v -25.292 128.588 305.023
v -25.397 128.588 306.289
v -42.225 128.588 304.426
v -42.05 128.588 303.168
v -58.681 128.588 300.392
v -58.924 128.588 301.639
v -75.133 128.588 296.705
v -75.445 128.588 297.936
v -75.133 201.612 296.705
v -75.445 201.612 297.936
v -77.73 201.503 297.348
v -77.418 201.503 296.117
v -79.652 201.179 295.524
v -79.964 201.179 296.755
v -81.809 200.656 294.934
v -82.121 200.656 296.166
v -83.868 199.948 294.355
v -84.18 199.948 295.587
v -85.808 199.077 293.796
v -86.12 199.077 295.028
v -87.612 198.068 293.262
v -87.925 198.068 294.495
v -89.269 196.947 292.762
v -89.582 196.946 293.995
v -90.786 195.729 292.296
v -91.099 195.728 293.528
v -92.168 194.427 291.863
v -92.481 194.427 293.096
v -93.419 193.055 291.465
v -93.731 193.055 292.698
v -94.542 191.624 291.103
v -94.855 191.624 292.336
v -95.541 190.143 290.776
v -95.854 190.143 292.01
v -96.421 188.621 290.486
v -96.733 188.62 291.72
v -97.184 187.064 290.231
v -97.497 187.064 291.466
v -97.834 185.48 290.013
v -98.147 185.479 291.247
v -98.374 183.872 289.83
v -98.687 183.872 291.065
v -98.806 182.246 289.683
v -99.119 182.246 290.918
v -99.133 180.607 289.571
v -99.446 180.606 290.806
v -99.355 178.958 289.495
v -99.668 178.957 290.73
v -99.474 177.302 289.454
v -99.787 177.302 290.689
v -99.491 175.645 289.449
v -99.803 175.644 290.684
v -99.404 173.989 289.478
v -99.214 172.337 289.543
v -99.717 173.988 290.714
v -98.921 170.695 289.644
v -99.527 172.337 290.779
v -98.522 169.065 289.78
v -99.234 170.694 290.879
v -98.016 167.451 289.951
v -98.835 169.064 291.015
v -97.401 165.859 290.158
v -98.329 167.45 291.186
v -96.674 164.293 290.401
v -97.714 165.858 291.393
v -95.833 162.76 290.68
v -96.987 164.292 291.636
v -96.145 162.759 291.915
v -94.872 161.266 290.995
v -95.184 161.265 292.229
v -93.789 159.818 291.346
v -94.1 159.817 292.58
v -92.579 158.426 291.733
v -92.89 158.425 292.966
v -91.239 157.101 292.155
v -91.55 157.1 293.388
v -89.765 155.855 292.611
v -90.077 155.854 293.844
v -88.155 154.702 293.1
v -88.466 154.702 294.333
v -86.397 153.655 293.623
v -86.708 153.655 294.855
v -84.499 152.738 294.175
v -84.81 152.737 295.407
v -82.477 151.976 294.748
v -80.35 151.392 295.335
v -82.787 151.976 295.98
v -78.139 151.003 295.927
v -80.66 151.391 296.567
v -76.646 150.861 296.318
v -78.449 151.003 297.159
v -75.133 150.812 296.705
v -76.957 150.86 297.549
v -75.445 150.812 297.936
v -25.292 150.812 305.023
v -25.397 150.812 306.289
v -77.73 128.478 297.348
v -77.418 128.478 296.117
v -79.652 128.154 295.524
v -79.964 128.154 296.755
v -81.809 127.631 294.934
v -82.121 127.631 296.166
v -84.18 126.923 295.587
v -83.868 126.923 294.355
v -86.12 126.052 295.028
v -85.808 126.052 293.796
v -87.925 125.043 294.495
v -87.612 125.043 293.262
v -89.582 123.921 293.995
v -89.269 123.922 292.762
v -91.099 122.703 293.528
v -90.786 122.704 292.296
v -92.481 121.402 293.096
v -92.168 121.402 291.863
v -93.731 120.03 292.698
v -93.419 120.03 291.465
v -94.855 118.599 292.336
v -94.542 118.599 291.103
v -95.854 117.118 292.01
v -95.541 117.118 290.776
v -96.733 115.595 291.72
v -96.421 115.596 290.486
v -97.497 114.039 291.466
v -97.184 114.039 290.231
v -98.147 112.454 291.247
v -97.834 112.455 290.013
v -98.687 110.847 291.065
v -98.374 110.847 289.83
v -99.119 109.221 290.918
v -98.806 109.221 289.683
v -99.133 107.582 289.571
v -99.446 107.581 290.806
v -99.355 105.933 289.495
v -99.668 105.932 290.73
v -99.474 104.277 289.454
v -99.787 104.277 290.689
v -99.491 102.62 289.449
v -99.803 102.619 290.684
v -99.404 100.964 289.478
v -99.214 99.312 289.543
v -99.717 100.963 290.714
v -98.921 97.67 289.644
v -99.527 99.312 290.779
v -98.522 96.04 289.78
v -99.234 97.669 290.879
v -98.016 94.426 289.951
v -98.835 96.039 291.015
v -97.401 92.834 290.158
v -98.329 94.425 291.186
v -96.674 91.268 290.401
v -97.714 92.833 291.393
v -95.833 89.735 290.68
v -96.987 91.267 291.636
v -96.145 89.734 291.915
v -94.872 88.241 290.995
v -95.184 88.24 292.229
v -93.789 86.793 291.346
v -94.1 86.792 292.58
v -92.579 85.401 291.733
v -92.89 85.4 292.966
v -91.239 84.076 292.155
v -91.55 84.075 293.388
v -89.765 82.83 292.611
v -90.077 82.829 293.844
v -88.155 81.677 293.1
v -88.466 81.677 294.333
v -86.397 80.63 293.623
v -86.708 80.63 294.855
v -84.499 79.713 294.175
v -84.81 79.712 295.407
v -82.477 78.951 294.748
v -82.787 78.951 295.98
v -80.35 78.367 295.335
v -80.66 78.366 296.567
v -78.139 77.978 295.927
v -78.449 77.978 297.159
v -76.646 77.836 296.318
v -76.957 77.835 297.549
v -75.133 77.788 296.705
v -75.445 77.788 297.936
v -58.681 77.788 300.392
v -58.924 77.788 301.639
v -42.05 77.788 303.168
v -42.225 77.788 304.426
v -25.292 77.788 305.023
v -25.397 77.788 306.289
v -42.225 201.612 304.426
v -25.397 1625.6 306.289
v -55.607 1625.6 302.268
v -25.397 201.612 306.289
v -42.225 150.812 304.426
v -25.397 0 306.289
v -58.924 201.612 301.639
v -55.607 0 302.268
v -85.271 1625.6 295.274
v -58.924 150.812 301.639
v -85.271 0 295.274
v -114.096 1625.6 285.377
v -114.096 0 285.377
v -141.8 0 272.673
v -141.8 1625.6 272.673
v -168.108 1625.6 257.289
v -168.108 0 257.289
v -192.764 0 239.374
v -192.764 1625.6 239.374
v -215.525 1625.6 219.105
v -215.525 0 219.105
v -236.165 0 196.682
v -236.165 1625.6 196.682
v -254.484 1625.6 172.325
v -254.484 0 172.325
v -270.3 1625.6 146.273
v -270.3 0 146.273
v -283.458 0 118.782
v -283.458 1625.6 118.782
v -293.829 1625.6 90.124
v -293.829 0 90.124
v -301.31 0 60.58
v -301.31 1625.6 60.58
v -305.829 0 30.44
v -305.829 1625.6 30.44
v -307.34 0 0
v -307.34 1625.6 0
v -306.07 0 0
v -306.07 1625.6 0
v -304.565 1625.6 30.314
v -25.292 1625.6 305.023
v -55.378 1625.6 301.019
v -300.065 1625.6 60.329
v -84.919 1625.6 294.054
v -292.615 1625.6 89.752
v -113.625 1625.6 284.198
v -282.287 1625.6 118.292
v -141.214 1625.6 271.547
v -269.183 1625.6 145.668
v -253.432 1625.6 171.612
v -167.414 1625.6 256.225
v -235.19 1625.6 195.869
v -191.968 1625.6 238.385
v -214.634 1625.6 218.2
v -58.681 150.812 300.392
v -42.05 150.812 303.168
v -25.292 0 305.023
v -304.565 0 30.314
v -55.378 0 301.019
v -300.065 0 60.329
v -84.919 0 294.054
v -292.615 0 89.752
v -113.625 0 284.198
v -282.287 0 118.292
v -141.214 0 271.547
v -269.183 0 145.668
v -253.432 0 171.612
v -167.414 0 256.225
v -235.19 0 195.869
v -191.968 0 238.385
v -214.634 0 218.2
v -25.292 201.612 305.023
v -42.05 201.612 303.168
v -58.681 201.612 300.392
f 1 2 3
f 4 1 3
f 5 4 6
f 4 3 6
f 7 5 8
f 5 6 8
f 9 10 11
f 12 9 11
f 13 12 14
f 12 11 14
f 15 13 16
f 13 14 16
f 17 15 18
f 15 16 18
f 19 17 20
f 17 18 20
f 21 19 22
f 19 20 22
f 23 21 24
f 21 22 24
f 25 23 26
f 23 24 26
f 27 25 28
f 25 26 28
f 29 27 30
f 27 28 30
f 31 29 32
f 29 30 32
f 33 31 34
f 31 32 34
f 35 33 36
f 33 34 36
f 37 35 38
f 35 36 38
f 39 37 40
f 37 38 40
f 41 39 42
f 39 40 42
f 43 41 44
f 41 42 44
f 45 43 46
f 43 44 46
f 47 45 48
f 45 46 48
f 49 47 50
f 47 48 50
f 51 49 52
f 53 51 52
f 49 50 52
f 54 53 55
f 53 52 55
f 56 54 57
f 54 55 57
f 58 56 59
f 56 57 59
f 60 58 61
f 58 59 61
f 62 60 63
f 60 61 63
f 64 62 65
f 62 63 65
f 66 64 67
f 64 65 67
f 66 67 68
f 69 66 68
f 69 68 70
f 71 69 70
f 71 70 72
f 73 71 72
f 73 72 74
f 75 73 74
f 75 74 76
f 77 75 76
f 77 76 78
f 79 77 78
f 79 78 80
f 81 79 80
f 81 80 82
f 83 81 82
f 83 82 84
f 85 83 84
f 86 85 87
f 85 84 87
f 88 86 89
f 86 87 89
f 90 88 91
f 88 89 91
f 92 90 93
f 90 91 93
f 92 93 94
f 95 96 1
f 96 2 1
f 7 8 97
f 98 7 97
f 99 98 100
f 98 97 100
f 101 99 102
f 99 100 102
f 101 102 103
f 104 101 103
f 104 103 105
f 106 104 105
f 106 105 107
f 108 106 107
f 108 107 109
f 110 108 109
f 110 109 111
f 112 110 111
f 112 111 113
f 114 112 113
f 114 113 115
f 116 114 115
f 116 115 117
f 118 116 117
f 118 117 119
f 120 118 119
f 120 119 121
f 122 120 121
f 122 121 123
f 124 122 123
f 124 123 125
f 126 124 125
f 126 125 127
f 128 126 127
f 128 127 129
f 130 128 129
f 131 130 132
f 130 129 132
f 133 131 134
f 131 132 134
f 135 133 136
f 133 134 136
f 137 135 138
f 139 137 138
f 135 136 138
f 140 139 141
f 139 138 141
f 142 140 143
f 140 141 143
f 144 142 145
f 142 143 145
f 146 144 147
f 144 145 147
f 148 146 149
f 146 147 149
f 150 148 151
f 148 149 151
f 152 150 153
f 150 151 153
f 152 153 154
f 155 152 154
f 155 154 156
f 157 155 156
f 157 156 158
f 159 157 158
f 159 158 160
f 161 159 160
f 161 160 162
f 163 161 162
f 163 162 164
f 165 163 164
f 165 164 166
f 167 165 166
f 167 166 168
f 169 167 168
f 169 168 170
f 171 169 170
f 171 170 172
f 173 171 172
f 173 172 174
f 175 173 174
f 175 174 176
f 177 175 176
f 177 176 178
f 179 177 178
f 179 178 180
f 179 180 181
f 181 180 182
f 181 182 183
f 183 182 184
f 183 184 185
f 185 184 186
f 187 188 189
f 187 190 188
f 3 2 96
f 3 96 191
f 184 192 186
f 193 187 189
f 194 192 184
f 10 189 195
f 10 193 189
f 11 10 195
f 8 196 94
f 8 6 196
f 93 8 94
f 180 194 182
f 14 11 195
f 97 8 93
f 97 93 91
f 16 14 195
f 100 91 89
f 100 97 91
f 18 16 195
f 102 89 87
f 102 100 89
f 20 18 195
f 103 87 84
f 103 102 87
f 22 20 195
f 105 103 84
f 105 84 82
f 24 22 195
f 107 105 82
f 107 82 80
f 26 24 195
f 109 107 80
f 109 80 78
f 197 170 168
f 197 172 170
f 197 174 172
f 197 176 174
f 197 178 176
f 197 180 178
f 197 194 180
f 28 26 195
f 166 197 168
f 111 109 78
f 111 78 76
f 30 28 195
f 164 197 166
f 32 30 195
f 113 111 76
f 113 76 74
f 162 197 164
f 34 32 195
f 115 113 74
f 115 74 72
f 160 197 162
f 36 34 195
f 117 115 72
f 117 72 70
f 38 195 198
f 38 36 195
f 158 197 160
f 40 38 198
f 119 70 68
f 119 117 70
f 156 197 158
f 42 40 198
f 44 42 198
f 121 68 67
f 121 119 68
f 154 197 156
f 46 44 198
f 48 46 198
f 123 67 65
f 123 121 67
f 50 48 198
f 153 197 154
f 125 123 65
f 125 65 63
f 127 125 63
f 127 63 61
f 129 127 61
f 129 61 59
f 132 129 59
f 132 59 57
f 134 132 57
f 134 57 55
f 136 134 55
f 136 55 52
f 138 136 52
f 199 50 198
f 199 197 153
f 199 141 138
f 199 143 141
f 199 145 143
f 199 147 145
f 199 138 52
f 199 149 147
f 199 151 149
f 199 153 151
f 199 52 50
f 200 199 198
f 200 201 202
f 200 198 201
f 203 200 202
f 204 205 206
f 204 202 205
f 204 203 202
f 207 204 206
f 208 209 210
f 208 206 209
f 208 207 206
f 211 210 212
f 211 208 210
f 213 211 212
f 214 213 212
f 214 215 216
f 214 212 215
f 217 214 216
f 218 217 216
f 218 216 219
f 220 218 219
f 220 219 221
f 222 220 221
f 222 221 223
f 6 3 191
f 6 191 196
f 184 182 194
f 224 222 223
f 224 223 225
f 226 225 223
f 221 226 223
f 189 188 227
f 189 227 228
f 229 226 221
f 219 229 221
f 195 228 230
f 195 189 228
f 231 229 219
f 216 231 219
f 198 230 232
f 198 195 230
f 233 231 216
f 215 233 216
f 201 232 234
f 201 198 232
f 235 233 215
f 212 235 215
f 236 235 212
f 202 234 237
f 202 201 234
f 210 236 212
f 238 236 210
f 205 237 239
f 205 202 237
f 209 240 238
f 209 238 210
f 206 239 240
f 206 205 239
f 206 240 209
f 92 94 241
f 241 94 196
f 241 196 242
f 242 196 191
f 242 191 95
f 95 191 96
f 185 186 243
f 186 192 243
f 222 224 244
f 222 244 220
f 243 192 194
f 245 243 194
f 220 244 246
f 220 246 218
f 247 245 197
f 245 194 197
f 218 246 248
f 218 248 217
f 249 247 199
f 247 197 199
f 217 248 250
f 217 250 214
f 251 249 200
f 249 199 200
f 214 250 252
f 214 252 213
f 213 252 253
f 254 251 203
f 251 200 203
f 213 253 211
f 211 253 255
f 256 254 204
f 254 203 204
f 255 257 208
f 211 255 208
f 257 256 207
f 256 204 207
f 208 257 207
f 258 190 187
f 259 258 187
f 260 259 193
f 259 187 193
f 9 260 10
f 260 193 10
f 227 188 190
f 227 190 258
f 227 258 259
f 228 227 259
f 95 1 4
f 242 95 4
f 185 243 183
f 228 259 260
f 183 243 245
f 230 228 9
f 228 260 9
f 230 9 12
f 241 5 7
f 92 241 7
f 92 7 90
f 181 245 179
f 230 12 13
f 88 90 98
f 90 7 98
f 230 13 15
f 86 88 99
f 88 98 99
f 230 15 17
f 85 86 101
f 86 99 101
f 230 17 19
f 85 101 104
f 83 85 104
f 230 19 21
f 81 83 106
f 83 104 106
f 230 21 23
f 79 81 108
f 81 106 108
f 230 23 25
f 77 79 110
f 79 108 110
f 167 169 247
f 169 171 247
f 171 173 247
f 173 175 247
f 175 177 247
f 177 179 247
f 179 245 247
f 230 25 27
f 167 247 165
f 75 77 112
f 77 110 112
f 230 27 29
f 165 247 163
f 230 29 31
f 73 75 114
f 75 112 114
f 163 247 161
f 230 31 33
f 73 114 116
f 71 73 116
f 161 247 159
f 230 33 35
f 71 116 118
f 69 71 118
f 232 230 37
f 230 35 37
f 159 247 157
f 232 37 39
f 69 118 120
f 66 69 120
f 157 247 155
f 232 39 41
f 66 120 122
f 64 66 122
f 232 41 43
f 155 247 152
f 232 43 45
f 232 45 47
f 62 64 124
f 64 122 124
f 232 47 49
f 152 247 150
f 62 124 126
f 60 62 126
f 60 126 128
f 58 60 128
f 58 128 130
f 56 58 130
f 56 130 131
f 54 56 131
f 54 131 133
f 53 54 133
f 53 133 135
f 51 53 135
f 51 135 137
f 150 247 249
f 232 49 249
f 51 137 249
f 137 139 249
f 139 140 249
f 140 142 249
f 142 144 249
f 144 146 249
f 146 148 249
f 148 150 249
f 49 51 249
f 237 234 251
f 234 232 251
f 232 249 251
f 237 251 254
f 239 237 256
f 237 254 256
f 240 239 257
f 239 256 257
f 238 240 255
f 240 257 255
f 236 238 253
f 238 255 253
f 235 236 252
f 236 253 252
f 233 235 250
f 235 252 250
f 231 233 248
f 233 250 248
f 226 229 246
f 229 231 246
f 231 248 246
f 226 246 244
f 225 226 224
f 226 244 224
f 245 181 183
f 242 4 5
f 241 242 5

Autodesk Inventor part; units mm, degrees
ref_plane "YZ Plane" through (0, 0, 0) normal (1, 0, 0) x (0, 1, 0)
ref_plane "XZ Plane" through (0, 0, 0) normal (0, 1, 0) x (-1, 0, 0)
sketch "Sketch1" plane through (0, 0, 0) normal (0, 1, 0) x (-1, 0, 0)
  arc A0 (307.34, 0) -> (25.3968, 306.2889) centre (0, 0) ccw
  line L0 (0, 0) -> (25.3968, 306.2889) construction
  line L1 (0, 0) -> (307.34, 0) construction
  arc A1 (306.07, 0) -> (25.2919, 305.0232) centre (0, 0) ccw
  line L2 (0, 0) -> (25.2919, 305.0232) construction
  line L3 (0, 0) -> (306.07, 0) construction
  line L4 (25.3968, 306.2889) -> (25.2919, 305.0232)
  line L5 (307.34, 0) -> (306.07, 0)
  dimension "d0" = 307.34
  dimension "d1" = 85.26
  dimension "d2" = 306.07
  dimension "d3" = 85.26
extrude "Extrusion1" add sketch "Sketch1" along normal blind 1625.6
sketch "Sketch2" plane through (0, 0, 0) normal (0, 1, 0) x (-1, 0, 0)
  arc A0 (75.4448, 297.9362) -> (25.3968, 306.2889) centre (0, 0) ccw
  line L0 (0, 0) -> (75.4448, 297.9362) construction
  line L1 (0, 0) -> (25.3968, 306.2889) construction
  arc A1 (123.4855, 281.4413) -> (25.3968, 306.2889) centre (0, 0) ccw
  line L2 (0, 0) -> (123.4855, 281.4413) construction
  line L3 (0, 0) -> (25.3968, 306.2889) construction
  arc A2 (307.34, 0) -> (290.6829, 99.8065) centre (0, 0) ccw
  line L4 (0, 0) -> (290.6829, 99.8065) construction
  line L5 (0, 0) -> (307.34, 0) construction
  dimension "d6" = 9.47
  dimension "d13" = 18.95
  dimension "d14" = 18.95
ref_plane "Work Plane1" through (-75.4448, 0, 297.9362) normal (-0.2454766, 0, 0.9694025) x (0, -1, 0)
sketch "Sketch3" plane through (-75.4448, 0, 297.9362) normal (-0.2454766, 0, 0.9694025) x (0, -1, 0)
  circle A0 centre (-103.1875, 0) radius 25.4
  line L0 (0, 50.567) -> (0, -297.9362) projected
  line L1 (0, 50.567) -> (-1625.6, 50.567) projected
  line L2 (-128.5875, 0) -> (-77.7875, 0)
  line L3 (-77.7875, 0) -> (-77.7875, 50.567)
  line L4 (-77.7875, 50.567) -> (-128.5875, 50.567)
  line L5 (-128.5875, 50.567) -> (-128.5875, 0)
  circle A1 centre (-176.2125, 0) radius 25.4
  line L6 (-201.6125, 0) -> (-150.8125, 0)
  line L7 (-150.8125, 0) -> (-150.8125, 50.567)
  line L8 (-150.8125, 50.567) -> (-201.6125, 50.567)
  line L9 (-201.6125, 50.567) -> (-201.6125, 0)
  point P0 (0, 0)
  dimension "d7" = 50.8
  dimension "d9" = 50.8
  dimension "d8" = 103.1875
  dimension "d10" = 176.2125
extrude "Extrusion2" cut sketch "Sketch3" against normal blind 25.4
properties part number "EDM Middle Shield Part 3"
